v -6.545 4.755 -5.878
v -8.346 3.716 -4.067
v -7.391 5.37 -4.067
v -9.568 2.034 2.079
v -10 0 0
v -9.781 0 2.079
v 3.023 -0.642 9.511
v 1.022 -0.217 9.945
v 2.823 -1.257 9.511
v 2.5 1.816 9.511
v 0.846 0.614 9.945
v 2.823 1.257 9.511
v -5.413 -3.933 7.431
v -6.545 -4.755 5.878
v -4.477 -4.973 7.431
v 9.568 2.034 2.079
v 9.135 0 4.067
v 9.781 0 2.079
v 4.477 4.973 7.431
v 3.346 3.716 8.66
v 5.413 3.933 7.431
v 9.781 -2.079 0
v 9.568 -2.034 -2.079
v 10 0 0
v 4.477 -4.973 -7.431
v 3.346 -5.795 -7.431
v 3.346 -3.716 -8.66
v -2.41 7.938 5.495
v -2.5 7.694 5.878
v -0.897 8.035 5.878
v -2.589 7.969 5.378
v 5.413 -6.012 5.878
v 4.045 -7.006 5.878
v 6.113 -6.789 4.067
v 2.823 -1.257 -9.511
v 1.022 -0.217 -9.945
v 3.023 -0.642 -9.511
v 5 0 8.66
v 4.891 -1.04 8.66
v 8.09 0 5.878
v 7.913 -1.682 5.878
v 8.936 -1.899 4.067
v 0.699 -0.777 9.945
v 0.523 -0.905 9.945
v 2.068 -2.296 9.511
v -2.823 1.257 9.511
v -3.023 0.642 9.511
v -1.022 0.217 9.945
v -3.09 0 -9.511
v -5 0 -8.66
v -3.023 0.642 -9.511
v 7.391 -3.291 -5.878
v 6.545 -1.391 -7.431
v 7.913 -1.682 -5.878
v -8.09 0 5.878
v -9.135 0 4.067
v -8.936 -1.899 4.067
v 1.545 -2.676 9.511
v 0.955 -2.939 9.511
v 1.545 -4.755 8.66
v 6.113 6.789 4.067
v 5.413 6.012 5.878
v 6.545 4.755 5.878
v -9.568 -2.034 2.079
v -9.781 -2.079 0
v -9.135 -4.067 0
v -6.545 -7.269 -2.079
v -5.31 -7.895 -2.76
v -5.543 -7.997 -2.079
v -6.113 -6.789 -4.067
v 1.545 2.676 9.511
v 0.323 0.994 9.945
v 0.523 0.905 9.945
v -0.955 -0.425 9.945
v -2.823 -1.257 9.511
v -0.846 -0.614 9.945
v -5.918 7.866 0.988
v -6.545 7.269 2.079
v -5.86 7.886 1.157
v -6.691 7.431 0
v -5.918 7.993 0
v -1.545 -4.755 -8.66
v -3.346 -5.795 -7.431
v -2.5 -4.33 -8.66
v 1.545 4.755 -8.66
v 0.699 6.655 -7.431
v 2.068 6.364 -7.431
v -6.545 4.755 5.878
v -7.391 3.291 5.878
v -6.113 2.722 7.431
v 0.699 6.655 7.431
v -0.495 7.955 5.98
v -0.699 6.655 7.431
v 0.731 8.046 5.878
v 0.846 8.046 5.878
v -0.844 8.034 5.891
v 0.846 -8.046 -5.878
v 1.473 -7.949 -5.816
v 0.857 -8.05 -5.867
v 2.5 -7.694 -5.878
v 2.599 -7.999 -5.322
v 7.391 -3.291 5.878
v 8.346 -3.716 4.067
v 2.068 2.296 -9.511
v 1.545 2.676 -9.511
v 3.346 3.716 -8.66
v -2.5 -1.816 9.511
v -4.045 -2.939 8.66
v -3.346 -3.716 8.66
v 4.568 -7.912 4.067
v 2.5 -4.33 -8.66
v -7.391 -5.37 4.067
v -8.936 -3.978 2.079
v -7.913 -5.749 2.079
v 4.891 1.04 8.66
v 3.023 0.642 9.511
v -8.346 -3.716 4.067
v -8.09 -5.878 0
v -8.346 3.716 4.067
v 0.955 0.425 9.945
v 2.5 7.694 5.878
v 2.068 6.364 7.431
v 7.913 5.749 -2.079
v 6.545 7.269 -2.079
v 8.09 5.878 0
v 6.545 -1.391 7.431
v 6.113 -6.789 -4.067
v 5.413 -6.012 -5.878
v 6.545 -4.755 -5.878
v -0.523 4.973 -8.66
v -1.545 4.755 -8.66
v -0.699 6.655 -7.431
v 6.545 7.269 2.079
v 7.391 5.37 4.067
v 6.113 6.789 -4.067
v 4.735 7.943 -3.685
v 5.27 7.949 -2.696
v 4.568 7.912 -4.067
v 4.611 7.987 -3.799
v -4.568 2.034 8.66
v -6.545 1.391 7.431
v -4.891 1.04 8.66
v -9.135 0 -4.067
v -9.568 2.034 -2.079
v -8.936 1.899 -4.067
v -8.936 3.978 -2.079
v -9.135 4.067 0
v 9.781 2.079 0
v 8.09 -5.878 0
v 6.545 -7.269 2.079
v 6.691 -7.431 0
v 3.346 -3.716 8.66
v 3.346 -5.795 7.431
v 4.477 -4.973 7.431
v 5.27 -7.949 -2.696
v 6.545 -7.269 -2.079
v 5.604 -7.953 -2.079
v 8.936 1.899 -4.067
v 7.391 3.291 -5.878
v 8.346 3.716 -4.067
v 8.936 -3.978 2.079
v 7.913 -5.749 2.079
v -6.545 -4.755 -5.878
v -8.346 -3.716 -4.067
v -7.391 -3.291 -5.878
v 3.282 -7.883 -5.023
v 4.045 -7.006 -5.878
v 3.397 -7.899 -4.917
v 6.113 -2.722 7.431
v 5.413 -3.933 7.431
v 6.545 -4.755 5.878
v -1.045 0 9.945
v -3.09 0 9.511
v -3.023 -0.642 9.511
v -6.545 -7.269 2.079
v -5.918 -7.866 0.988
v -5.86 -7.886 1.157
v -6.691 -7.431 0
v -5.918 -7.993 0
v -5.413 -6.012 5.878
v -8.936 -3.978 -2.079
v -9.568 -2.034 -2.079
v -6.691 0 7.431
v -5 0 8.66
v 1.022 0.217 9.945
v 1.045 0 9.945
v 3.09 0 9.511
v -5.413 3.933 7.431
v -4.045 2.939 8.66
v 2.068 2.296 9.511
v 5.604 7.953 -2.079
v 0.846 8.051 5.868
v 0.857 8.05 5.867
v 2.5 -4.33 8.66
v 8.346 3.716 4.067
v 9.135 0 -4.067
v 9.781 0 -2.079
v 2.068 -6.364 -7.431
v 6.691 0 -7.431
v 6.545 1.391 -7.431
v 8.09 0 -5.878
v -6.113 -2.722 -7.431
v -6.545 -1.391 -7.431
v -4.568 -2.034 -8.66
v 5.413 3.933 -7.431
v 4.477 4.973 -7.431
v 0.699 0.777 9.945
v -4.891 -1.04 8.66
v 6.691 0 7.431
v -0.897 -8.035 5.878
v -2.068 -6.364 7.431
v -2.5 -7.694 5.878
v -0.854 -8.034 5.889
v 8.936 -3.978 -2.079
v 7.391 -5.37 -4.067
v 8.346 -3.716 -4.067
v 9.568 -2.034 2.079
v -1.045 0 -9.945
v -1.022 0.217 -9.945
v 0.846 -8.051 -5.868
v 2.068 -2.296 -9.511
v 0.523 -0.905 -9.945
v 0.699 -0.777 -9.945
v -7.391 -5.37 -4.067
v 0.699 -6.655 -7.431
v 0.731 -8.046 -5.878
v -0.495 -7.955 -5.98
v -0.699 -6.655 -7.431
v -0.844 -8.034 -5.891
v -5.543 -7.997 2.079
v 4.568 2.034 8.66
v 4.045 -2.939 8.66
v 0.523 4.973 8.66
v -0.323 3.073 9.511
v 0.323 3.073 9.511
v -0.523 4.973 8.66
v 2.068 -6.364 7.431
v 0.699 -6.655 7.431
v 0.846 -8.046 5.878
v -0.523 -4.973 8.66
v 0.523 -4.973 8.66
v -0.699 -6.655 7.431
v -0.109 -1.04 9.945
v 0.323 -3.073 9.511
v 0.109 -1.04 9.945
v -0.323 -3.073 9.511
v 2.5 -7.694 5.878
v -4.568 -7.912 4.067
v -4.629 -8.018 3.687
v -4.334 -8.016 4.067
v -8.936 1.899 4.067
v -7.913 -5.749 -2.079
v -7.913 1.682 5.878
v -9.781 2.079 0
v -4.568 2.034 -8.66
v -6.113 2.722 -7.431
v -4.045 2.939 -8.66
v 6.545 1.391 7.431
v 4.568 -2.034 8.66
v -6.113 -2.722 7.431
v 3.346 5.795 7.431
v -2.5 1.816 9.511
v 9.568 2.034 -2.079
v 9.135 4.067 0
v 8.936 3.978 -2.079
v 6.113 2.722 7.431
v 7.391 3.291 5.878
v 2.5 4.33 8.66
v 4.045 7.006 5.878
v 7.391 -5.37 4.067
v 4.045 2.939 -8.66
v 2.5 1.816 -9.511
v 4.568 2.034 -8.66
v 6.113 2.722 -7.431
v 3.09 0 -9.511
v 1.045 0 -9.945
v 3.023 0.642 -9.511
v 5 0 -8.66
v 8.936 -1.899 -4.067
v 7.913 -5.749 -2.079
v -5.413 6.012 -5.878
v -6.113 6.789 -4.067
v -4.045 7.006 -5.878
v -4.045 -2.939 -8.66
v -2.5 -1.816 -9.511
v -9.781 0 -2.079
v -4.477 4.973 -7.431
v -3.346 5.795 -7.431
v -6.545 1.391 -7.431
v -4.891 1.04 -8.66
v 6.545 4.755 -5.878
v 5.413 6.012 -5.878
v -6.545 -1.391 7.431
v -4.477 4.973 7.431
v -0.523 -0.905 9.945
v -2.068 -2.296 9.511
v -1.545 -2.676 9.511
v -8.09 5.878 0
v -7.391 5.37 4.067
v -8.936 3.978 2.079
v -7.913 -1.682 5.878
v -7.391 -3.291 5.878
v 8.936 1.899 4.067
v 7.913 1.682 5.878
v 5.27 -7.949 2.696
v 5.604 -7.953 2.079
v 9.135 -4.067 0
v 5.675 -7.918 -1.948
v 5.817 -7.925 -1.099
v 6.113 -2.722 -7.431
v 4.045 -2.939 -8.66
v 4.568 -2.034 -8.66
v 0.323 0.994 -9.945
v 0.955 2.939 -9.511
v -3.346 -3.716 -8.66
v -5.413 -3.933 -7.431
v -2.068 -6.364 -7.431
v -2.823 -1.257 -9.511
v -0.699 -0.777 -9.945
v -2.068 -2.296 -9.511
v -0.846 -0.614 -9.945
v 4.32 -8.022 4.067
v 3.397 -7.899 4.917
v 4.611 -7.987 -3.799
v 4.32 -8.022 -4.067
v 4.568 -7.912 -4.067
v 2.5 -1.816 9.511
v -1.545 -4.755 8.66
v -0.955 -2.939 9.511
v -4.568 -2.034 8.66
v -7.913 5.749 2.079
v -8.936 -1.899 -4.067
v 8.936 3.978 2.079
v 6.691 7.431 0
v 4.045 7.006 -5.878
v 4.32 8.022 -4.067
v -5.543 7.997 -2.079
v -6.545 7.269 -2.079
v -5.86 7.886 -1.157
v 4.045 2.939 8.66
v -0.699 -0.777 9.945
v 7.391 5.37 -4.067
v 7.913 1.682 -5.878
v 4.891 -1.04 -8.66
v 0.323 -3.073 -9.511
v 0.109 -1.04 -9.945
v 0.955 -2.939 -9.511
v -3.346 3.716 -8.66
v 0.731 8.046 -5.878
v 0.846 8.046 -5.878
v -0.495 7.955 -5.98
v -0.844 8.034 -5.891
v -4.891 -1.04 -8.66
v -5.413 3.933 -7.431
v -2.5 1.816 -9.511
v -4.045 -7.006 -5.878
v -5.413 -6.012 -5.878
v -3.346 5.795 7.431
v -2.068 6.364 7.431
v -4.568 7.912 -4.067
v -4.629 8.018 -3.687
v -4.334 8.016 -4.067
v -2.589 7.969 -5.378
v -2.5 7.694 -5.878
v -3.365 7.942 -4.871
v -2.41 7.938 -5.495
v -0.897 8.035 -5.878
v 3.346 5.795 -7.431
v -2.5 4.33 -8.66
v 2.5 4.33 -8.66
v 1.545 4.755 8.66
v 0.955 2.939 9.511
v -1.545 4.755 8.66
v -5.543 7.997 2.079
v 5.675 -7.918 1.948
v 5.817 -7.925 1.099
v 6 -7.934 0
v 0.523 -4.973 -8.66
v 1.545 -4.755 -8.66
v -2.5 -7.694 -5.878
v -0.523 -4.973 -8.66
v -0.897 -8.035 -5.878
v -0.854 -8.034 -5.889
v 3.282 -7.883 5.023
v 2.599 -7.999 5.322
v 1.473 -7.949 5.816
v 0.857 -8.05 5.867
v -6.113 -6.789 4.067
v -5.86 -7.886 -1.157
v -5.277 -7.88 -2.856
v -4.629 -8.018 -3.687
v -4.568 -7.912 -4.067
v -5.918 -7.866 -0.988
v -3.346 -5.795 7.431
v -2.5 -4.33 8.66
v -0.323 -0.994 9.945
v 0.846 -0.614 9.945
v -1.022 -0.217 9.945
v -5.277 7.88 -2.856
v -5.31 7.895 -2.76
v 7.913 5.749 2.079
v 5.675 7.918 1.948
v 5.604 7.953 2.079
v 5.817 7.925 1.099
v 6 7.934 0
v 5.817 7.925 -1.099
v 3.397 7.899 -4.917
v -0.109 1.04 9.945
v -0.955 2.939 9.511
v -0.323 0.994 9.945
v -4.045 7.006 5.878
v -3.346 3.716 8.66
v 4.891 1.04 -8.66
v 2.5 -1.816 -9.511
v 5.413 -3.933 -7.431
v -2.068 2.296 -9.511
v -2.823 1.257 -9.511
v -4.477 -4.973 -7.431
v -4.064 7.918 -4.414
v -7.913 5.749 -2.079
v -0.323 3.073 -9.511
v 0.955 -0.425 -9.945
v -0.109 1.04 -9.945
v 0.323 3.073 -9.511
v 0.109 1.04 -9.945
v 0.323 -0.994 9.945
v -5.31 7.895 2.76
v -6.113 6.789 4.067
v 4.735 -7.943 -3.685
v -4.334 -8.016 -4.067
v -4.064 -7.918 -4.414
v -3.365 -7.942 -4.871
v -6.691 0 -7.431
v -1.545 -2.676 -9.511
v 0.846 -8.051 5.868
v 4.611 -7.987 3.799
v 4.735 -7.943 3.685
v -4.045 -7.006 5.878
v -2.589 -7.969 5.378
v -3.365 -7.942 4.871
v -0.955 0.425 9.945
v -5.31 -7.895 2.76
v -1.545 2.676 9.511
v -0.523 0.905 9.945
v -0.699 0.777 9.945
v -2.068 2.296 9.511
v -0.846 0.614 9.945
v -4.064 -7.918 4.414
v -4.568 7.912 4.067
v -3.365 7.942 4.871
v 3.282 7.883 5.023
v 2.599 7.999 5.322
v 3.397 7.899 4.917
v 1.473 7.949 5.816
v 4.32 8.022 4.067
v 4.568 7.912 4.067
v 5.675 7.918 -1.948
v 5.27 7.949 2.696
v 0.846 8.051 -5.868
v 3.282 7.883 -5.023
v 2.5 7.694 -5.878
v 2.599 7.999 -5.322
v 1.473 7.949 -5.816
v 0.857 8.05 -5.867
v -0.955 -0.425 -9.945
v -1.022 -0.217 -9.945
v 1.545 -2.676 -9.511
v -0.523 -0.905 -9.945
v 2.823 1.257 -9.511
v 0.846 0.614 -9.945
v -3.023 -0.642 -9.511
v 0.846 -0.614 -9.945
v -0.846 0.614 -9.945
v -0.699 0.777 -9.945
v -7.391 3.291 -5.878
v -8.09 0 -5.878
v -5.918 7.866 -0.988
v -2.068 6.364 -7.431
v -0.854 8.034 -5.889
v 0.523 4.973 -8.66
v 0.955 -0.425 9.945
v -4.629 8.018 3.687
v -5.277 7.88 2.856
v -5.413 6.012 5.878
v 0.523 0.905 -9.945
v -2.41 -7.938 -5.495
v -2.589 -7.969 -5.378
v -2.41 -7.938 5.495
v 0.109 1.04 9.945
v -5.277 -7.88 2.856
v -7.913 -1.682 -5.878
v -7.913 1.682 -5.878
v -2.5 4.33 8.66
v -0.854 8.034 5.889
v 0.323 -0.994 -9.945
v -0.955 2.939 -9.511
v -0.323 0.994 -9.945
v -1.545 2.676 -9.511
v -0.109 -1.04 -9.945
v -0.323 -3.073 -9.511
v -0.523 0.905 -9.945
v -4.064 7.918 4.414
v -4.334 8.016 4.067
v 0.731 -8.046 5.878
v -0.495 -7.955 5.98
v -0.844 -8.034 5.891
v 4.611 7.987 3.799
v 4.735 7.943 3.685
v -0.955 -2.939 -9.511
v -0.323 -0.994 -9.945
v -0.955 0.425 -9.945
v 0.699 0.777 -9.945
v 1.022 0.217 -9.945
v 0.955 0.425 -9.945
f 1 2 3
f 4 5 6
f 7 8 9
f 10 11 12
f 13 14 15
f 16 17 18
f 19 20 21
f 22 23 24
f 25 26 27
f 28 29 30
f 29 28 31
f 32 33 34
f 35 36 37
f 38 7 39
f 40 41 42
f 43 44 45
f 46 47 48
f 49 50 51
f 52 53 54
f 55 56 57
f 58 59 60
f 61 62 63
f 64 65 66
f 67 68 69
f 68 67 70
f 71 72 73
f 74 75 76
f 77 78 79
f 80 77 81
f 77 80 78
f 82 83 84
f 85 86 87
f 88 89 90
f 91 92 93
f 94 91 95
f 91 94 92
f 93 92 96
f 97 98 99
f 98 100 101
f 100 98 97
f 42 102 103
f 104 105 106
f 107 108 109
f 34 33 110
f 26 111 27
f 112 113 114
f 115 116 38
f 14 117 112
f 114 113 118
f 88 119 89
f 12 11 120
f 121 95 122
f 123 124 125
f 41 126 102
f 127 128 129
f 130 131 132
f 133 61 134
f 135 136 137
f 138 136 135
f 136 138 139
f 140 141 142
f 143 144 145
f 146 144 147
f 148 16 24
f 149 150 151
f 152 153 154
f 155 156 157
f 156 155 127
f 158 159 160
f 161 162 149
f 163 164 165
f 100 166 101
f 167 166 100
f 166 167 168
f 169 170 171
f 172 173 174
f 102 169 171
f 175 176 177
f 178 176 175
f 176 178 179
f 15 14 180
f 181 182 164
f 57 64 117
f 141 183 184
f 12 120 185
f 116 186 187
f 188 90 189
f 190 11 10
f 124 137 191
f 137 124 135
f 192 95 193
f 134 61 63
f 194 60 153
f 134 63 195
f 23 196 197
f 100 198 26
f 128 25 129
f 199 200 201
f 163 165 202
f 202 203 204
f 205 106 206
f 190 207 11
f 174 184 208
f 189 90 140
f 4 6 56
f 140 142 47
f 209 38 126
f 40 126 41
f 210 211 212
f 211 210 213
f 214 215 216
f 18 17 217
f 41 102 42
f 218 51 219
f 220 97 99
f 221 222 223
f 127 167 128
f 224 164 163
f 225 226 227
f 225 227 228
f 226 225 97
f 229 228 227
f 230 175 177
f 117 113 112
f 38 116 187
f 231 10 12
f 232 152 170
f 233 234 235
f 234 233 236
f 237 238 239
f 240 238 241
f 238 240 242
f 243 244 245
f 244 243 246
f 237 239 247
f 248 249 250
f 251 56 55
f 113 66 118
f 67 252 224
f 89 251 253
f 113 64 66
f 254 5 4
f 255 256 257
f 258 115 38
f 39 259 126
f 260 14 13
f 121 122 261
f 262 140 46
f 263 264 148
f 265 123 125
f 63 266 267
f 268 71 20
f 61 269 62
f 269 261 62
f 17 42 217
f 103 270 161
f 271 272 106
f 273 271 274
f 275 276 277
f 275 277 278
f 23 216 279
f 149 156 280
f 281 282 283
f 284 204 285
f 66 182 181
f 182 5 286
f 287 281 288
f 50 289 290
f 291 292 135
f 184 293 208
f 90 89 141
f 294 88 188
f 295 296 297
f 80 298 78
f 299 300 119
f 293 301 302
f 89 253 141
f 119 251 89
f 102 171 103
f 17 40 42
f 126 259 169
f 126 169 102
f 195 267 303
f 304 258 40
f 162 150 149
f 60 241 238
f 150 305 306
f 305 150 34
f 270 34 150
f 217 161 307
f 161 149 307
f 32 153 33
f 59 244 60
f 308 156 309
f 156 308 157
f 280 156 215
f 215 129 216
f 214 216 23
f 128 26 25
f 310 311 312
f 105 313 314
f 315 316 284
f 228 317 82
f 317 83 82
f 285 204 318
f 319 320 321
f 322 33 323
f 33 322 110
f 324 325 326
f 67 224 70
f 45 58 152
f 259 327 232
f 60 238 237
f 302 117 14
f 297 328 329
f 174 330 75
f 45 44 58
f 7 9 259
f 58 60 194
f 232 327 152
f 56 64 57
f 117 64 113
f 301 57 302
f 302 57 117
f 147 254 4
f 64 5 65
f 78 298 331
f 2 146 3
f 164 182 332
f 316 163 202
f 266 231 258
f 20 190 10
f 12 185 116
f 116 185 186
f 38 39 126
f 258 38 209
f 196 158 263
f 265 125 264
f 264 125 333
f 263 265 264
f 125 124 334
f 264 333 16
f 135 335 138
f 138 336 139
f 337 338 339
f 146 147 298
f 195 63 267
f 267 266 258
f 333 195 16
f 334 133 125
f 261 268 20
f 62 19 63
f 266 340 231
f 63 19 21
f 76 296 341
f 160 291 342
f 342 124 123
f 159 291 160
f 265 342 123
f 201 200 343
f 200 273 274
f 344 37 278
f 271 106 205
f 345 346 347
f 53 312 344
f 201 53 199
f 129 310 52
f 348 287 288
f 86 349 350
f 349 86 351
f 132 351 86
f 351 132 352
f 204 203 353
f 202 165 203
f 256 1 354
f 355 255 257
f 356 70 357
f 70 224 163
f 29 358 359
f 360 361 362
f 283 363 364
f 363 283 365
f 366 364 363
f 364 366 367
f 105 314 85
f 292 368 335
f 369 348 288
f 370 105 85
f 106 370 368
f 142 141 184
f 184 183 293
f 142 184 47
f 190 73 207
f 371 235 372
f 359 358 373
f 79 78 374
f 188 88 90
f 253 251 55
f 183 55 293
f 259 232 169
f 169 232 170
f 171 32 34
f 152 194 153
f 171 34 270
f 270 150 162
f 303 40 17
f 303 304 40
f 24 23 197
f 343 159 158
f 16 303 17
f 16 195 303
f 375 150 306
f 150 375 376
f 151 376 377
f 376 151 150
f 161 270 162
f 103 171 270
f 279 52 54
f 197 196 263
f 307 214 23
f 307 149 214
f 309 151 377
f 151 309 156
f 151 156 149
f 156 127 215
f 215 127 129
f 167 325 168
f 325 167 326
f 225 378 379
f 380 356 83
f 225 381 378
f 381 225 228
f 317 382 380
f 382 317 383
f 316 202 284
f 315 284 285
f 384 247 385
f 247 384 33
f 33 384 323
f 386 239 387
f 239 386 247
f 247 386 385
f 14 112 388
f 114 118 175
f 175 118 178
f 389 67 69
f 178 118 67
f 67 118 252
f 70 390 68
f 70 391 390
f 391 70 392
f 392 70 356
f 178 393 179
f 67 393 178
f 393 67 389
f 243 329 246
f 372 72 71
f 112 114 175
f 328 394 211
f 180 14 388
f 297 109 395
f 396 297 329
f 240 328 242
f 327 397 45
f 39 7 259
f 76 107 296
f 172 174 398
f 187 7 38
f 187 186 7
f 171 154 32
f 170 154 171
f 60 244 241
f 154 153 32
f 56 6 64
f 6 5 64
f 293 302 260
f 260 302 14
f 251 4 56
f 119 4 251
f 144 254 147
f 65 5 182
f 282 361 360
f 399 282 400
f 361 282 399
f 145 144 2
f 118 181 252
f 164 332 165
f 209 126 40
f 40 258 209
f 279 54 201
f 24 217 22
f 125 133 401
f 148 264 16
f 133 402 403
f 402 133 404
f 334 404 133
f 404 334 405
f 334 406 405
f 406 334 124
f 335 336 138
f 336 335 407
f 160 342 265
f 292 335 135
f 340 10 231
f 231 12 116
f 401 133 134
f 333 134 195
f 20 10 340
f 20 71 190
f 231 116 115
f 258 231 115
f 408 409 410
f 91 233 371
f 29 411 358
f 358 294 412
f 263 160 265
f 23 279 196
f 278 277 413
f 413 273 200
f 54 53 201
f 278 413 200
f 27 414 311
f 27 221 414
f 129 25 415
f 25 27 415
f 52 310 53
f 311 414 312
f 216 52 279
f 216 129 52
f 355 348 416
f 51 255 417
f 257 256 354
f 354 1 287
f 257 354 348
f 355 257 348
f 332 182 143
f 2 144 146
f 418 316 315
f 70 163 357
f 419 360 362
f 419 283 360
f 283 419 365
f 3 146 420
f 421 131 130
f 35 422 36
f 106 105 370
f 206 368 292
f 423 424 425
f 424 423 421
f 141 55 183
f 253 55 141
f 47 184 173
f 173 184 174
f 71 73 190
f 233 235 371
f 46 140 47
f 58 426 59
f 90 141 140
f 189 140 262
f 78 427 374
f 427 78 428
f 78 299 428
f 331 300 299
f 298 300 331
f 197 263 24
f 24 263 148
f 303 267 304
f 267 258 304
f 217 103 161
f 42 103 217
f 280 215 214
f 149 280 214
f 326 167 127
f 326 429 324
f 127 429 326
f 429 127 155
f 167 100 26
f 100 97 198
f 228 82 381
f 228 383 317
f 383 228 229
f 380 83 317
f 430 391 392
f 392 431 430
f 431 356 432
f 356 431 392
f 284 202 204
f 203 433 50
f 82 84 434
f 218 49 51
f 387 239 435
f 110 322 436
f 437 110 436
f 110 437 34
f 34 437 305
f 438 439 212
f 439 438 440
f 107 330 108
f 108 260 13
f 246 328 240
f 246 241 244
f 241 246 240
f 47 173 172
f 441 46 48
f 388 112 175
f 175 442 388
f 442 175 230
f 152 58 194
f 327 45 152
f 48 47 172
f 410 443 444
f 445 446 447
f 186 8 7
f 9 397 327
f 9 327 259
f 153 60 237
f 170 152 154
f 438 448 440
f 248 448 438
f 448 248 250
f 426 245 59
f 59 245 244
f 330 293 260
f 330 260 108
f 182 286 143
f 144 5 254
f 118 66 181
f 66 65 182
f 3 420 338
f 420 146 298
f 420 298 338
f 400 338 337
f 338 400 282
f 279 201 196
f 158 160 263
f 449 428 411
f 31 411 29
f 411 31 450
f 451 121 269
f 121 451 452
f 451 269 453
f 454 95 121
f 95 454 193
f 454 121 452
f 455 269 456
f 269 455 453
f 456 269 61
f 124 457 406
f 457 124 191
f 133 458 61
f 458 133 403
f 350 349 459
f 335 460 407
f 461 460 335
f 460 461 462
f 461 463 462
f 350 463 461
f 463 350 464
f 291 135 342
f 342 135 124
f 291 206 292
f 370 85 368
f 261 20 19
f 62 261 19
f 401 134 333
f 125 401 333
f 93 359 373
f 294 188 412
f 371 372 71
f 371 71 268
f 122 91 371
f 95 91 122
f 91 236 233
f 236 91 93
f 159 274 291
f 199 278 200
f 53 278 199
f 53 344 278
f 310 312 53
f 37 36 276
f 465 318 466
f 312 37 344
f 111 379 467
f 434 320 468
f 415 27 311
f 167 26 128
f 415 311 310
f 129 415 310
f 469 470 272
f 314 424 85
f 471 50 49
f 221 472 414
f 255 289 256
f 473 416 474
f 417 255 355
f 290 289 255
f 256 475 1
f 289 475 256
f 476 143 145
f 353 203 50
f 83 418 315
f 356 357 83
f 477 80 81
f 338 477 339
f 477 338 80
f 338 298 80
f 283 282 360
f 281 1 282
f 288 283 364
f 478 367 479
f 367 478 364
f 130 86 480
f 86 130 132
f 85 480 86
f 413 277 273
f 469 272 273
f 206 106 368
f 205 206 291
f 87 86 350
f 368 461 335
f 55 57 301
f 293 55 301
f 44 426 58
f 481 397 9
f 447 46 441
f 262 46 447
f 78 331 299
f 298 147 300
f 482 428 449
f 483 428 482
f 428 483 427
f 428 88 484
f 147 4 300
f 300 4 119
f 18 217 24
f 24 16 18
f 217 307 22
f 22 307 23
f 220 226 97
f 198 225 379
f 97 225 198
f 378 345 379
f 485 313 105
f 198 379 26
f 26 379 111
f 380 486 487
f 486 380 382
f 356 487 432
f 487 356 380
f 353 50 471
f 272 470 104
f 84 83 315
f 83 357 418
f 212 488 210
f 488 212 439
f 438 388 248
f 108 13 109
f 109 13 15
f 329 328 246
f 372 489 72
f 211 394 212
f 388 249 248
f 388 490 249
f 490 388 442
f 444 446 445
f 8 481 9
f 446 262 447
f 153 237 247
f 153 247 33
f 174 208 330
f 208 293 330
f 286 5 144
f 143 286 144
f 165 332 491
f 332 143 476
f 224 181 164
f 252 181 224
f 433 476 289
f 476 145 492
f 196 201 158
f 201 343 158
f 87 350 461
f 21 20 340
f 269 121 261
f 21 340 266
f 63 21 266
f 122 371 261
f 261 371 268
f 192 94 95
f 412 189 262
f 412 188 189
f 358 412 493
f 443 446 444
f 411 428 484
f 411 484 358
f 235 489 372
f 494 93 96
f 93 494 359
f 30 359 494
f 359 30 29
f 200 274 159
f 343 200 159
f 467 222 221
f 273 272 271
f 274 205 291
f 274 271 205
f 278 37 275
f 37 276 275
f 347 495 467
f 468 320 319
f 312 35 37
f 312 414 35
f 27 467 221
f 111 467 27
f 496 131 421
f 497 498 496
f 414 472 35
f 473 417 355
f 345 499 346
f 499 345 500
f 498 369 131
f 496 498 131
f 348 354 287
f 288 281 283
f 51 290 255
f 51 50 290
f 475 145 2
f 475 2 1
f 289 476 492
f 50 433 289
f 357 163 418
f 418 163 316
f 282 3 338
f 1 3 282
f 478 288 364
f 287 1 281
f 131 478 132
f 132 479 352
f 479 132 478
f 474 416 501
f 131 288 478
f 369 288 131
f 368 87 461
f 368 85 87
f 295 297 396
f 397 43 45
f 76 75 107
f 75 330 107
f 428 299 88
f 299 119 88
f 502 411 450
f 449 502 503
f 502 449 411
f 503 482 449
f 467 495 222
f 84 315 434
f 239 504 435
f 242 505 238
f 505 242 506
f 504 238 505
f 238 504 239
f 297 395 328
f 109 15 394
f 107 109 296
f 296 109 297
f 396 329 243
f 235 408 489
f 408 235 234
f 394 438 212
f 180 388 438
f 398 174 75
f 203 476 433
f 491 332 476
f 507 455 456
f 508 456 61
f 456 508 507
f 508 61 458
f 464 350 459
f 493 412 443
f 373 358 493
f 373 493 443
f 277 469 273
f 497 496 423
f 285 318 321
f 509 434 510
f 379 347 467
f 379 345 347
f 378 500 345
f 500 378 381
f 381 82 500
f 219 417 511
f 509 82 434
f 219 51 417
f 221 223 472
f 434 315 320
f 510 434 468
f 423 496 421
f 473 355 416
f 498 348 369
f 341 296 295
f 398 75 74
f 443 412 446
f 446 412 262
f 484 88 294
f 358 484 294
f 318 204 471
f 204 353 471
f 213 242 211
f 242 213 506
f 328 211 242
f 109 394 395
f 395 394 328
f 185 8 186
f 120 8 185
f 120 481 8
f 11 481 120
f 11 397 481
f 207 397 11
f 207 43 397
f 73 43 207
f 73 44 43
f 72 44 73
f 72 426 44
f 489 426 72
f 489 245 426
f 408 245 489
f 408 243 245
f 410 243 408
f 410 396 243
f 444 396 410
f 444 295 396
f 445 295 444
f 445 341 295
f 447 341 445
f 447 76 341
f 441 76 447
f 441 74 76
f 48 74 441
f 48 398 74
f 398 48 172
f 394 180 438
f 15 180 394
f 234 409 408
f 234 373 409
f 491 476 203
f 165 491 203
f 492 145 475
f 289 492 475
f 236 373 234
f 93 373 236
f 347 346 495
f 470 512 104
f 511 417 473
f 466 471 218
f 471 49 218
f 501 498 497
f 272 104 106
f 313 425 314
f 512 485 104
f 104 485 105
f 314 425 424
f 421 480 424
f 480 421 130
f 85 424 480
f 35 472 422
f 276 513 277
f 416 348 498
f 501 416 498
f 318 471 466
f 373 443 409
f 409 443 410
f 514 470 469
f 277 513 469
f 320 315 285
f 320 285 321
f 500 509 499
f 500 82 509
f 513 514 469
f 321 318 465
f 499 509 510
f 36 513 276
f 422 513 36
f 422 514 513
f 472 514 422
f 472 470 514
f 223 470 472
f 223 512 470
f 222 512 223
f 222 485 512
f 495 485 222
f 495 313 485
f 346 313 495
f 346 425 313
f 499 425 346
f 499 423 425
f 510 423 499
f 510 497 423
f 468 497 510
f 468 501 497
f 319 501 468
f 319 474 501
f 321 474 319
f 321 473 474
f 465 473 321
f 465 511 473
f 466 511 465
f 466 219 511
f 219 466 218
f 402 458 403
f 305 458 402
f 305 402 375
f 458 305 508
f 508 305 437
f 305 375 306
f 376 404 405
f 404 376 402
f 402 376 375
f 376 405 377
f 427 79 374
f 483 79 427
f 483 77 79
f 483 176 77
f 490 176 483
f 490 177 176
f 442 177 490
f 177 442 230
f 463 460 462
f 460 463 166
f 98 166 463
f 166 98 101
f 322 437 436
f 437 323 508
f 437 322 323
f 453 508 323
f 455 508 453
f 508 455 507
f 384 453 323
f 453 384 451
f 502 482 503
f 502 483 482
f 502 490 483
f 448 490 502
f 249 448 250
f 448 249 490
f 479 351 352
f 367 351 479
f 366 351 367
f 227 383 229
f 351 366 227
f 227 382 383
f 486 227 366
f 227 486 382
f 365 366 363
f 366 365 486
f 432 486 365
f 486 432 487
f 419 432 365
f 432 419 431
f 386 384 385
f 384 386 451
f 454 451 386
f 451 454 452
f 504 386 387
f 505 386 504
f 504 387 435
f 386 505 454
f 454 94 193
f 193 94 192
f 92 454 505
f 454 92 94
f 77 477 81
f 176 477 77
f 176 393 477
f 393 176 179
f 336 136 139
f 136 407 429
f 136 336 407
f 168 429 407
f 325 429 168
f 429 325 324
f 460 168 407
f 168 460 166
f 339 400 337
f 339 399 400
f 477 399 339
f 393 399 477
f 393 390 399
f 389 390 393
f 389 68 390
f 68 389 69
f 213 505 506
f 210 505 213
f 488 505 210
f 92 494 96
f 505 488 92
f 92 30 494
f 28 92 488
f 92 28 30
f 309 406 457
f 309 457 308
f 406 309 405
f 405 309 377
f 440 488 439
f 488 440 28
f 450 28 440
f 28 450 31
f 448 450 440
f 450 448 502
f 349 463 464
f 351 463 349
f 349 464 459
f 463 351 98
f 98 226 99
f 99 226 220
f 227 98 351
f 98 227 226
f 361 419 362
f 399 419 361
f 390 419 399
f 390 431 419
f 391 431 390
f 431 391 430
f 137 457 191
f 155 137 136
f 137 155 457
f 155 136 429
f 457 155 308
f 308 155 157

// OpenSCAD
// Volume: 4112.861654538725, SurfaceArea: 1245.2051191189146
module all_transparent() {
 %children();
}

module first_transparent() {
 %children(0);
}

difference() {
  sphere(r=10);
  all_transparent() cylinder(h=30, r=6, center=true);
  first_transparent() rotate([90,0,0]) cylinder(h=30, r=6, center=true);
}
